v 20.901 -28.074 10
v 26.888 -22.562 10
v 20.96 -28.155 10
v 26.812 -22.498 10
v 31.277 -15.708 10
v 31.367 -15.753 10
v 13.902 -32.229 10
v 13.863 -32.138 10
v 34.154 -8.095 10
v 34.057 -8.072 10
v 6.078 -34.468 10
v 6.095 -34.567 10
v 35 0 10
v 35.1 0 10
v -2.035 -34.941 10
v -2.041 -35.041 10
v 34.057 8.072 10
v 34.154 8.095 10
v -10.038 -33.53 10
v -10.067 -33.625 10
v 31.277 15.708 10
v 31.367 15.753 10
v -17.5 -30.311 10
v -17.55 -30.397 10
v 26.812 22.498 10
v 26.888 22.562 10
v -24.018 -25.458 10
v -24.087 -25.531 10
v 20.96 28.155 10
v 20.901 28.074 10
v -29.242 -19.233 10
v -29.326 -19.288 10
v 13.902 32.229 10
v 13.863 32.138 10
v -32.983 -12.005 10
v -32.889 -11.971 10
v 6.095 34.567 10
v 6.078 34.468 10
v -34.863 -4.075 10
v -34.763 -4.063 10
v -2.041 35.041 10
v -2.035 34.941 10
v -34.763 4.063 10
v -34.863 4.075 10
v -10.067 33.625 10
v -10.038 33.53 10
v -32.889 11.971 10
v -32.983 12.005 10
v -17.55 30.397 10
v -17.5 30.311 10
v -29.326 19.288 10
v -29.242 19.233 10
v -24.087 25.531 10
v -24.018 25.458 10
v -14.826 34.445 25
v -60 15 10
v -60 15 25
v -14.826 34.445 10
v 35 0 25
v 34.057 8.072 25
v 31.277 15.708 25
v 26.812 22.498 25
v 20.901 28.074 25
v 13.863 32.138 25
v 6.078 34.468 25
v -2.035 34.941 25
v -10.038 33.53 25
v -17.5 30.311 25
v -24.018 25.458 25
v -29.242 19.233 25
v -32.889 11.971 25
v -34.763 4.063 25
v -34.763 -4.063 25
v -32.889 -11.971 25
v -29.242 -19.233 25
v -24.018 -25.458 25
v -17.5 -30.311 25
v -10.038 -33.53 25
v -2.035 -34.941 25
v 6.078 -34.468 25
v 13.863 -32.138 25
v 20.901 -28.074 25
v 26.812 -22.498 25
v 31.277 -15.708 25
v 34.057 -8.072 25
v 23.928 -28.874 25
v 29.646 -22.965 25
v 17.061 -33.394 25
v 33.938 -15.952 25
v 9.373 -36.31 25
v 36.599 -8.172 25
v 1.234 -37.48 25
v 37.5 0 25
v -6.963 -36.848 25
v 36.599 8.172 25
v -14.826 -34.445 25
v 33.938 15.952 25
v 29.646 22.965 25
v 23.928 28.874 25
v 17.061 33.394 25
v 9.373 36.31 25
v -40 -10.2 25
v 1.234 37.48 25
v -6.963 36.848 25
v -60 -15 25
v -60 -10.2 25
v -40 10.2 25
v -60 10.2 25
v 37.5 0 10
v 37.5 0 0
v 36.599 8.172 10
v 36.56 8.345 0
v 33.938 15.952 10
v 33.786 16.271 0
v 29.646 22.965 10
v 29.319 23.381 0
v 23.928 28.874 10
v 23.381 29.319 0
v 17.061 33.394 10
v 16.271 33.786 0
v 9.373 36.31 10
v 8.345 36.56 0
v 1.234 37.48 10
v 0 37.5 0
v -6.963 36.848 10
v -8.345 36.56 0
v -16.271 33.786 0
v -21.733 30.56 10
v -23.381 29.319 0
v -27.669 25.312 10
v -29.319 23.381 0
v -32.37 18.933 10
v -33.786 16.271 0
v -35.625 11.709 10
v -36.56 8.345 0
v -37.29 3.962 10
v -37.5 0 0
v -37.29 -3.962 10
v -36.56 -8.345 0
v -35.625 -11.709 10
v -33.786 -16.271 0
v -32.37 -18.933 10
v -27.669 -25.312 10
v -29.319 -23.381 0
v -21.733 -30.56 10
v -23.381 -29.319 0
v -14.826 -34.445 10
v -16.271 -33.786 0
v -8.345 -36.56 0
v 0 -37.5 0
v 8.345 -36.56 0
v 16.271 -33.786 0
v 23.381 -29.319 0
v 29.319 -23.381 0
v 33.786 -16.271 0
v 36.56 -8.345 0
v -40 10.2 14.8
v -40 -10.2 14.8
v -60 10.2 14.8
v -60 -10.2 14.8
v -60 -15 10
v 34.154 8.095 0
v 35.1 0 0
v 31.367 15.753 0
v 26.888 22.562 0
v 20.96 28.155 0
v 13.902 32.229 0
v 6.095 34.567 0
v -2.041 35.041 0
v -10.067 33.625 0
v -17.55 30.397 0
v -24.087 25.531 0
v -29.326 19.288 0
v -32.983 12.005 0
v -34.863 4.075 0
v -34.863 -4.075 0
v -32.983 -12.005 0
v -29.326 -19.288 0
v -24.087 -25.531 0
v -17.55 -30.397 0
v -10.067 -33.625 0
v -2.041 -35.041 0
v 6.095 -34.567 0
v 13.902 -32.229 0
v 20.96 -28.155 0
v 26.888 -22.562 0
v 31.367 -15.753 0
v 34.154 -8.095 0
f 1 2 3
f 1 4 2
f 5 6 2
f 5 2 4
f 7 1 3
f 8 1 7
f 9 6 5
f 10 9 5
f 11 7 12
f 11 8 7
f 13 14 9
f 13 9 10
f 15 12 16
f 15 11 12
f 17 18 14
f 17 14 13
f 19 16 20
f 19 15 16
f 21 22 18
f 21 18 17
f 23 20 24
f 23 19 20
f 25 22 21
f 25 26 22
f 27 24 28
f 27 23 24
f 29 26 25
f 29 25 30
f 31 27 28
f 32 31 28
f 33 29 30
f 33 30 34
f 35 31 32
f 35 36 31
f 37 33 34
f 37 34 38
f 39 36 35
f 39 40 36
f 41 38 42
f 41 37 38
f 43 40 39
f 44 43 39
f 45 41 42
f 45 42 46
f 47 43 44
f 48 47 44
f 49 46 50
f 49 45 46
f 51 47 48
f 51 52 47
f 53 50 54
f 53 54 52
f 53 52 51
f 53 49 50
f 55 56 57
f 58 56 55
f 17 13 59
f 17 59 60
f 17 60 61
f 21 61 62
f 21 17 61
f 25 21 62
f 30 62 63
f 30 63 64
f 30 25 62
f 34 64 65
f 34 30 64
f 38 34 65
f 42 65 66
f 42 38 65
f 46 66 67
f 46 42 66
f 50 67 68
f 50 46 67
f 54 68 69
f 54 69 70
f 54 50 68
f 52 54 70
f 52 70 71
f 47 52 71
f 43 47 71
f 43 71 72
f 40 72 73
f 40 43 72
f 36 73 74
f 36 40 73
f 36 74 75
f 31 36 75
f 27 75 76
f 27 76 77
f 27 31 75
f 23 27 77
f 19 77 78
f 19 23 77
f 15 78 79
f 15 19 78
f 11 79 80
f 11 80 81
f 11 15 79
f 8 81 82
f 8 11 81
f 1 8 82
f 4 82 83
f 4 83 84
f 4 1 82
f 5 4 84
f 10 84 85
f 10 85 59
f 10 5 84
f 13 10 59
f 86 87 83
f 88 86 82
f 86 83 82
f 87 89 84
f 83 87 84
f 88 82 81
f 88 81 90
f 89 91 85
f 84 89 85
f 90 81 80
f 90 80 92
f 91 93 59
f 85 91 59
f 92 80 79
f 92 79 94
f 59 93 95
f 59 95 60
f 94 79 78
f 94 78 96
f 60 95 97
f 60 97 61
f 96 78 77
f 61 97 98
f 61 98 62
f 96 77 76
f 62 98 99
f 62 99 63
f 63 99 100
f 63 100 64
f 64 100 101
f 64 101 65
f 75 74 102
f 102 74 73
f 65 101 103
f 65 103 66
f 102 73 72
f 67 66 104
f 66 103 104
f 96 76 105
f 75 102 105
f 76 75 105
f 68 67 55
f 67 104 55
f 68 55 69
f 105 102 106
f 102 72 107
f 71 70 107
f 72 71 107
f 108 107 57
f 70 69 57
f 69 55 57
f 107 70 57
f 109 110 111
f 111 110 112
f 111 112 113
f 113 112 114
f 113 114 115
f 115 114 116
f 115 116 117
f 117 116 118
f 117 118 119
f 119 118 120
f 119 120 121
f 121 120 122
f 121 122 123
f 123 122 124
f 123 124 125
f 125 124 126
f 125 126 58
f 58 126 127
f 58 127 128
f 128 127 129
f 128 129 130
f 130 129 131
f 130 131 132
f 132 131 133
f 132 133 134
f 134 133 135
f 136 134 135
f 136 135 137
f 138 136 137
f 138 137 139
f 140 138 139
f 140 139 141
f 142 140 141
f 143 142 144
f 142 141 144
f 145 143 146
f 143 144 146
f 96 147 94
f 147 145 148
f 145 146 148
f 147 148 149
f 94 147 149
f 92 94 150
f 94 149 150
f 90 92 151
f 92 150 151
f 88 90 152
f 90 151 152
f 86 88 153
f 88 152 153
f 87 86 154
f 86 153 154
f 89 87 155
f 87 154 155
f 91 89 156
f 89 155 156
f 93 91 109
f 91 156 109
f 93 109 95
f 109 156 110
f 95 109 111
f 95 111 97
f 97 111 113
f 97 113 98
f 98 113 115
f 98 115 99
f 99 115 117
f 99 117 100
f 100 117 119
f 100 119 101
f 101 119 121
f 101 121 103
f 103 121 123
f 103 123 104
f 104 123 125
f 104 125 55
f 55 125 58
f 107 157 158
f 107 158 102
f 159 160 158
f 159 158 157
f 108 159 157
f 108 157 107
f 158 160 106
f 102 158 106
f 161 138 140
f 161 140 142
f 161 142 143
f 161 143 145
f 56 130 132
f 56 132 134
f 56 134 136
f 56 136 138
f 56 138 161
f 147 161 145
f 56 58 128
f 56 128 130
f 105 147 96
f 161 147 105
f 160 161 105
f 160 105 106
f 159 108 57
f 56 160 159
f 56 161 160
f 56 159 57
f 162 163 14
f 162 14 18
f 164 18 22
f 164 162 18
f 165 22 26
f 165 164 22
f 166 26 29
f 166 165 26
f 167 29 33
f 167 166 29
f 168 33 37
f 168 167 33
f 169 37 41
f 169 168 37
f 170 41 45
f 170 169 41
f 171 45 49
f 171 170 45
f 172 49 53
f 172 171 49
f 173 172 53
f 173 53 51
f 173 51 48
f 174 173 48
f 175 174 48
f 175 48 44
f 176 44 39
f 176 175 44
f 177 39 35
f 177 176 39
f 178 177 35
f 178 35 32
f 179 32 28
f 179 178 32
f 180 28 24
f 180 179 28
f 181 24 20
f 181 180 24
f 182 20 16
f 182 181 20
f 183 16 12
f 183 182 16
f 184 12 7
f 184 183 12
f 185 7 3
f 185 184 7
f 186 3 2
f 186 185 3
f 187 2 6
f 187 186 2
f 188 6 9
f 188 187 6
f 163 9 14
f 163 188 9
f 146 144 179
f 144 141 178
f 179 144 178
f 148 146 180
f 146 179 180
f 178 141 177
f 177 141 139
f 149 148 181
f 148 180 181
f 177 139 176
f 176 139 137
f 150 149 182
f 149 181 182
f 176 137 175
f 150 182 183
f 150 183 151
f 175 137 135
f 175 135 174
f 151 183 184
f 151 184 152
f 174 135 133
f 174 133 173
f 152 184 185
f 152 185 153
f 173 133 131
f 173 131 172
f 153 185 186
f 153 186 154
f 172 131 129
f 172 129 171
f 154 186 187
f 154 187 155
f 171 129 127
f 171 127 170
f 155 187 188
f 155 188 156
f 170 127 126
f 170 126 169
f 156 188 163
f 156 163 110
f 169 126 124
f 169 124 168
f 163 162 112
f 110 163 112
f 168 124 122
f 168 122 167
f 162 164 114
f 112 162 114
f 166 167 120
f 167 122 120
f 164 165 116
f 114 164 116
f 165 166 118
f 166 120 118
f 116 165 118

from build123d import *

# Parameters (mm, degrees)
ESQUISSE1_R             = 37.5
ESQUISSE1_R_2           = 35.1
BOSS_EXTRU_1_DEPTH      = 10
ESQUISSE2_R             = 35
BOSS_EXTRU_2_DEPTH      = 15
ESQUISSE6_W             = 10.2
ESQUISSE6_H             = 20.4
ENL_V_MAT_EXTRU_1_DEPTH = 20


with BuildPart() as part:
    # Esquisse1 → Boss.-Extru.1 (new body)
    with BuildSketch(Plane.XY):
        Circle(ESQUISSE1_R)
        Circle(ESQUISSE1_R_2, mode=Mode.SUBTRACT)
    extrude(amount=BOSS_EXTRU_1_DEPTH)

    # Esquisse2 → Boss.-Extru.2 (add)
    with BuildSketch(Plane.XY.offset(10)):
        with BuildLine():
            Line((-60, -15), (-60, 15))
            Line((-60, 15), (-14.826354569, 34.444581725))
            ThreePointArc((-14.826354569, 34.444581725), (37.5, 0), (-14.826354569, -34.444581725))
            Line((-14.826354569, -34.444581725), (-60, -15))
        make_face()
        Circle(ESQUISSE2_R, mode=Mode.SUBTRACT)
    extrude(amount=BOSS_EXTRU_2_DEPTH)

    # Esquisse6 → Enlèv. mat.-Extru.1 (cut)
    with BuildSketch(Plane.ZY.offset(60)):
        with Locations((19.9, 0)):
            Rectangle(ESQUISSE6_W, ESQUISSE6_H)
    extrude(amount=-ENL_V_MAT_EXTRU_1_DEPTH, mode=Mode.SUBTRACT)


solid = part.part
